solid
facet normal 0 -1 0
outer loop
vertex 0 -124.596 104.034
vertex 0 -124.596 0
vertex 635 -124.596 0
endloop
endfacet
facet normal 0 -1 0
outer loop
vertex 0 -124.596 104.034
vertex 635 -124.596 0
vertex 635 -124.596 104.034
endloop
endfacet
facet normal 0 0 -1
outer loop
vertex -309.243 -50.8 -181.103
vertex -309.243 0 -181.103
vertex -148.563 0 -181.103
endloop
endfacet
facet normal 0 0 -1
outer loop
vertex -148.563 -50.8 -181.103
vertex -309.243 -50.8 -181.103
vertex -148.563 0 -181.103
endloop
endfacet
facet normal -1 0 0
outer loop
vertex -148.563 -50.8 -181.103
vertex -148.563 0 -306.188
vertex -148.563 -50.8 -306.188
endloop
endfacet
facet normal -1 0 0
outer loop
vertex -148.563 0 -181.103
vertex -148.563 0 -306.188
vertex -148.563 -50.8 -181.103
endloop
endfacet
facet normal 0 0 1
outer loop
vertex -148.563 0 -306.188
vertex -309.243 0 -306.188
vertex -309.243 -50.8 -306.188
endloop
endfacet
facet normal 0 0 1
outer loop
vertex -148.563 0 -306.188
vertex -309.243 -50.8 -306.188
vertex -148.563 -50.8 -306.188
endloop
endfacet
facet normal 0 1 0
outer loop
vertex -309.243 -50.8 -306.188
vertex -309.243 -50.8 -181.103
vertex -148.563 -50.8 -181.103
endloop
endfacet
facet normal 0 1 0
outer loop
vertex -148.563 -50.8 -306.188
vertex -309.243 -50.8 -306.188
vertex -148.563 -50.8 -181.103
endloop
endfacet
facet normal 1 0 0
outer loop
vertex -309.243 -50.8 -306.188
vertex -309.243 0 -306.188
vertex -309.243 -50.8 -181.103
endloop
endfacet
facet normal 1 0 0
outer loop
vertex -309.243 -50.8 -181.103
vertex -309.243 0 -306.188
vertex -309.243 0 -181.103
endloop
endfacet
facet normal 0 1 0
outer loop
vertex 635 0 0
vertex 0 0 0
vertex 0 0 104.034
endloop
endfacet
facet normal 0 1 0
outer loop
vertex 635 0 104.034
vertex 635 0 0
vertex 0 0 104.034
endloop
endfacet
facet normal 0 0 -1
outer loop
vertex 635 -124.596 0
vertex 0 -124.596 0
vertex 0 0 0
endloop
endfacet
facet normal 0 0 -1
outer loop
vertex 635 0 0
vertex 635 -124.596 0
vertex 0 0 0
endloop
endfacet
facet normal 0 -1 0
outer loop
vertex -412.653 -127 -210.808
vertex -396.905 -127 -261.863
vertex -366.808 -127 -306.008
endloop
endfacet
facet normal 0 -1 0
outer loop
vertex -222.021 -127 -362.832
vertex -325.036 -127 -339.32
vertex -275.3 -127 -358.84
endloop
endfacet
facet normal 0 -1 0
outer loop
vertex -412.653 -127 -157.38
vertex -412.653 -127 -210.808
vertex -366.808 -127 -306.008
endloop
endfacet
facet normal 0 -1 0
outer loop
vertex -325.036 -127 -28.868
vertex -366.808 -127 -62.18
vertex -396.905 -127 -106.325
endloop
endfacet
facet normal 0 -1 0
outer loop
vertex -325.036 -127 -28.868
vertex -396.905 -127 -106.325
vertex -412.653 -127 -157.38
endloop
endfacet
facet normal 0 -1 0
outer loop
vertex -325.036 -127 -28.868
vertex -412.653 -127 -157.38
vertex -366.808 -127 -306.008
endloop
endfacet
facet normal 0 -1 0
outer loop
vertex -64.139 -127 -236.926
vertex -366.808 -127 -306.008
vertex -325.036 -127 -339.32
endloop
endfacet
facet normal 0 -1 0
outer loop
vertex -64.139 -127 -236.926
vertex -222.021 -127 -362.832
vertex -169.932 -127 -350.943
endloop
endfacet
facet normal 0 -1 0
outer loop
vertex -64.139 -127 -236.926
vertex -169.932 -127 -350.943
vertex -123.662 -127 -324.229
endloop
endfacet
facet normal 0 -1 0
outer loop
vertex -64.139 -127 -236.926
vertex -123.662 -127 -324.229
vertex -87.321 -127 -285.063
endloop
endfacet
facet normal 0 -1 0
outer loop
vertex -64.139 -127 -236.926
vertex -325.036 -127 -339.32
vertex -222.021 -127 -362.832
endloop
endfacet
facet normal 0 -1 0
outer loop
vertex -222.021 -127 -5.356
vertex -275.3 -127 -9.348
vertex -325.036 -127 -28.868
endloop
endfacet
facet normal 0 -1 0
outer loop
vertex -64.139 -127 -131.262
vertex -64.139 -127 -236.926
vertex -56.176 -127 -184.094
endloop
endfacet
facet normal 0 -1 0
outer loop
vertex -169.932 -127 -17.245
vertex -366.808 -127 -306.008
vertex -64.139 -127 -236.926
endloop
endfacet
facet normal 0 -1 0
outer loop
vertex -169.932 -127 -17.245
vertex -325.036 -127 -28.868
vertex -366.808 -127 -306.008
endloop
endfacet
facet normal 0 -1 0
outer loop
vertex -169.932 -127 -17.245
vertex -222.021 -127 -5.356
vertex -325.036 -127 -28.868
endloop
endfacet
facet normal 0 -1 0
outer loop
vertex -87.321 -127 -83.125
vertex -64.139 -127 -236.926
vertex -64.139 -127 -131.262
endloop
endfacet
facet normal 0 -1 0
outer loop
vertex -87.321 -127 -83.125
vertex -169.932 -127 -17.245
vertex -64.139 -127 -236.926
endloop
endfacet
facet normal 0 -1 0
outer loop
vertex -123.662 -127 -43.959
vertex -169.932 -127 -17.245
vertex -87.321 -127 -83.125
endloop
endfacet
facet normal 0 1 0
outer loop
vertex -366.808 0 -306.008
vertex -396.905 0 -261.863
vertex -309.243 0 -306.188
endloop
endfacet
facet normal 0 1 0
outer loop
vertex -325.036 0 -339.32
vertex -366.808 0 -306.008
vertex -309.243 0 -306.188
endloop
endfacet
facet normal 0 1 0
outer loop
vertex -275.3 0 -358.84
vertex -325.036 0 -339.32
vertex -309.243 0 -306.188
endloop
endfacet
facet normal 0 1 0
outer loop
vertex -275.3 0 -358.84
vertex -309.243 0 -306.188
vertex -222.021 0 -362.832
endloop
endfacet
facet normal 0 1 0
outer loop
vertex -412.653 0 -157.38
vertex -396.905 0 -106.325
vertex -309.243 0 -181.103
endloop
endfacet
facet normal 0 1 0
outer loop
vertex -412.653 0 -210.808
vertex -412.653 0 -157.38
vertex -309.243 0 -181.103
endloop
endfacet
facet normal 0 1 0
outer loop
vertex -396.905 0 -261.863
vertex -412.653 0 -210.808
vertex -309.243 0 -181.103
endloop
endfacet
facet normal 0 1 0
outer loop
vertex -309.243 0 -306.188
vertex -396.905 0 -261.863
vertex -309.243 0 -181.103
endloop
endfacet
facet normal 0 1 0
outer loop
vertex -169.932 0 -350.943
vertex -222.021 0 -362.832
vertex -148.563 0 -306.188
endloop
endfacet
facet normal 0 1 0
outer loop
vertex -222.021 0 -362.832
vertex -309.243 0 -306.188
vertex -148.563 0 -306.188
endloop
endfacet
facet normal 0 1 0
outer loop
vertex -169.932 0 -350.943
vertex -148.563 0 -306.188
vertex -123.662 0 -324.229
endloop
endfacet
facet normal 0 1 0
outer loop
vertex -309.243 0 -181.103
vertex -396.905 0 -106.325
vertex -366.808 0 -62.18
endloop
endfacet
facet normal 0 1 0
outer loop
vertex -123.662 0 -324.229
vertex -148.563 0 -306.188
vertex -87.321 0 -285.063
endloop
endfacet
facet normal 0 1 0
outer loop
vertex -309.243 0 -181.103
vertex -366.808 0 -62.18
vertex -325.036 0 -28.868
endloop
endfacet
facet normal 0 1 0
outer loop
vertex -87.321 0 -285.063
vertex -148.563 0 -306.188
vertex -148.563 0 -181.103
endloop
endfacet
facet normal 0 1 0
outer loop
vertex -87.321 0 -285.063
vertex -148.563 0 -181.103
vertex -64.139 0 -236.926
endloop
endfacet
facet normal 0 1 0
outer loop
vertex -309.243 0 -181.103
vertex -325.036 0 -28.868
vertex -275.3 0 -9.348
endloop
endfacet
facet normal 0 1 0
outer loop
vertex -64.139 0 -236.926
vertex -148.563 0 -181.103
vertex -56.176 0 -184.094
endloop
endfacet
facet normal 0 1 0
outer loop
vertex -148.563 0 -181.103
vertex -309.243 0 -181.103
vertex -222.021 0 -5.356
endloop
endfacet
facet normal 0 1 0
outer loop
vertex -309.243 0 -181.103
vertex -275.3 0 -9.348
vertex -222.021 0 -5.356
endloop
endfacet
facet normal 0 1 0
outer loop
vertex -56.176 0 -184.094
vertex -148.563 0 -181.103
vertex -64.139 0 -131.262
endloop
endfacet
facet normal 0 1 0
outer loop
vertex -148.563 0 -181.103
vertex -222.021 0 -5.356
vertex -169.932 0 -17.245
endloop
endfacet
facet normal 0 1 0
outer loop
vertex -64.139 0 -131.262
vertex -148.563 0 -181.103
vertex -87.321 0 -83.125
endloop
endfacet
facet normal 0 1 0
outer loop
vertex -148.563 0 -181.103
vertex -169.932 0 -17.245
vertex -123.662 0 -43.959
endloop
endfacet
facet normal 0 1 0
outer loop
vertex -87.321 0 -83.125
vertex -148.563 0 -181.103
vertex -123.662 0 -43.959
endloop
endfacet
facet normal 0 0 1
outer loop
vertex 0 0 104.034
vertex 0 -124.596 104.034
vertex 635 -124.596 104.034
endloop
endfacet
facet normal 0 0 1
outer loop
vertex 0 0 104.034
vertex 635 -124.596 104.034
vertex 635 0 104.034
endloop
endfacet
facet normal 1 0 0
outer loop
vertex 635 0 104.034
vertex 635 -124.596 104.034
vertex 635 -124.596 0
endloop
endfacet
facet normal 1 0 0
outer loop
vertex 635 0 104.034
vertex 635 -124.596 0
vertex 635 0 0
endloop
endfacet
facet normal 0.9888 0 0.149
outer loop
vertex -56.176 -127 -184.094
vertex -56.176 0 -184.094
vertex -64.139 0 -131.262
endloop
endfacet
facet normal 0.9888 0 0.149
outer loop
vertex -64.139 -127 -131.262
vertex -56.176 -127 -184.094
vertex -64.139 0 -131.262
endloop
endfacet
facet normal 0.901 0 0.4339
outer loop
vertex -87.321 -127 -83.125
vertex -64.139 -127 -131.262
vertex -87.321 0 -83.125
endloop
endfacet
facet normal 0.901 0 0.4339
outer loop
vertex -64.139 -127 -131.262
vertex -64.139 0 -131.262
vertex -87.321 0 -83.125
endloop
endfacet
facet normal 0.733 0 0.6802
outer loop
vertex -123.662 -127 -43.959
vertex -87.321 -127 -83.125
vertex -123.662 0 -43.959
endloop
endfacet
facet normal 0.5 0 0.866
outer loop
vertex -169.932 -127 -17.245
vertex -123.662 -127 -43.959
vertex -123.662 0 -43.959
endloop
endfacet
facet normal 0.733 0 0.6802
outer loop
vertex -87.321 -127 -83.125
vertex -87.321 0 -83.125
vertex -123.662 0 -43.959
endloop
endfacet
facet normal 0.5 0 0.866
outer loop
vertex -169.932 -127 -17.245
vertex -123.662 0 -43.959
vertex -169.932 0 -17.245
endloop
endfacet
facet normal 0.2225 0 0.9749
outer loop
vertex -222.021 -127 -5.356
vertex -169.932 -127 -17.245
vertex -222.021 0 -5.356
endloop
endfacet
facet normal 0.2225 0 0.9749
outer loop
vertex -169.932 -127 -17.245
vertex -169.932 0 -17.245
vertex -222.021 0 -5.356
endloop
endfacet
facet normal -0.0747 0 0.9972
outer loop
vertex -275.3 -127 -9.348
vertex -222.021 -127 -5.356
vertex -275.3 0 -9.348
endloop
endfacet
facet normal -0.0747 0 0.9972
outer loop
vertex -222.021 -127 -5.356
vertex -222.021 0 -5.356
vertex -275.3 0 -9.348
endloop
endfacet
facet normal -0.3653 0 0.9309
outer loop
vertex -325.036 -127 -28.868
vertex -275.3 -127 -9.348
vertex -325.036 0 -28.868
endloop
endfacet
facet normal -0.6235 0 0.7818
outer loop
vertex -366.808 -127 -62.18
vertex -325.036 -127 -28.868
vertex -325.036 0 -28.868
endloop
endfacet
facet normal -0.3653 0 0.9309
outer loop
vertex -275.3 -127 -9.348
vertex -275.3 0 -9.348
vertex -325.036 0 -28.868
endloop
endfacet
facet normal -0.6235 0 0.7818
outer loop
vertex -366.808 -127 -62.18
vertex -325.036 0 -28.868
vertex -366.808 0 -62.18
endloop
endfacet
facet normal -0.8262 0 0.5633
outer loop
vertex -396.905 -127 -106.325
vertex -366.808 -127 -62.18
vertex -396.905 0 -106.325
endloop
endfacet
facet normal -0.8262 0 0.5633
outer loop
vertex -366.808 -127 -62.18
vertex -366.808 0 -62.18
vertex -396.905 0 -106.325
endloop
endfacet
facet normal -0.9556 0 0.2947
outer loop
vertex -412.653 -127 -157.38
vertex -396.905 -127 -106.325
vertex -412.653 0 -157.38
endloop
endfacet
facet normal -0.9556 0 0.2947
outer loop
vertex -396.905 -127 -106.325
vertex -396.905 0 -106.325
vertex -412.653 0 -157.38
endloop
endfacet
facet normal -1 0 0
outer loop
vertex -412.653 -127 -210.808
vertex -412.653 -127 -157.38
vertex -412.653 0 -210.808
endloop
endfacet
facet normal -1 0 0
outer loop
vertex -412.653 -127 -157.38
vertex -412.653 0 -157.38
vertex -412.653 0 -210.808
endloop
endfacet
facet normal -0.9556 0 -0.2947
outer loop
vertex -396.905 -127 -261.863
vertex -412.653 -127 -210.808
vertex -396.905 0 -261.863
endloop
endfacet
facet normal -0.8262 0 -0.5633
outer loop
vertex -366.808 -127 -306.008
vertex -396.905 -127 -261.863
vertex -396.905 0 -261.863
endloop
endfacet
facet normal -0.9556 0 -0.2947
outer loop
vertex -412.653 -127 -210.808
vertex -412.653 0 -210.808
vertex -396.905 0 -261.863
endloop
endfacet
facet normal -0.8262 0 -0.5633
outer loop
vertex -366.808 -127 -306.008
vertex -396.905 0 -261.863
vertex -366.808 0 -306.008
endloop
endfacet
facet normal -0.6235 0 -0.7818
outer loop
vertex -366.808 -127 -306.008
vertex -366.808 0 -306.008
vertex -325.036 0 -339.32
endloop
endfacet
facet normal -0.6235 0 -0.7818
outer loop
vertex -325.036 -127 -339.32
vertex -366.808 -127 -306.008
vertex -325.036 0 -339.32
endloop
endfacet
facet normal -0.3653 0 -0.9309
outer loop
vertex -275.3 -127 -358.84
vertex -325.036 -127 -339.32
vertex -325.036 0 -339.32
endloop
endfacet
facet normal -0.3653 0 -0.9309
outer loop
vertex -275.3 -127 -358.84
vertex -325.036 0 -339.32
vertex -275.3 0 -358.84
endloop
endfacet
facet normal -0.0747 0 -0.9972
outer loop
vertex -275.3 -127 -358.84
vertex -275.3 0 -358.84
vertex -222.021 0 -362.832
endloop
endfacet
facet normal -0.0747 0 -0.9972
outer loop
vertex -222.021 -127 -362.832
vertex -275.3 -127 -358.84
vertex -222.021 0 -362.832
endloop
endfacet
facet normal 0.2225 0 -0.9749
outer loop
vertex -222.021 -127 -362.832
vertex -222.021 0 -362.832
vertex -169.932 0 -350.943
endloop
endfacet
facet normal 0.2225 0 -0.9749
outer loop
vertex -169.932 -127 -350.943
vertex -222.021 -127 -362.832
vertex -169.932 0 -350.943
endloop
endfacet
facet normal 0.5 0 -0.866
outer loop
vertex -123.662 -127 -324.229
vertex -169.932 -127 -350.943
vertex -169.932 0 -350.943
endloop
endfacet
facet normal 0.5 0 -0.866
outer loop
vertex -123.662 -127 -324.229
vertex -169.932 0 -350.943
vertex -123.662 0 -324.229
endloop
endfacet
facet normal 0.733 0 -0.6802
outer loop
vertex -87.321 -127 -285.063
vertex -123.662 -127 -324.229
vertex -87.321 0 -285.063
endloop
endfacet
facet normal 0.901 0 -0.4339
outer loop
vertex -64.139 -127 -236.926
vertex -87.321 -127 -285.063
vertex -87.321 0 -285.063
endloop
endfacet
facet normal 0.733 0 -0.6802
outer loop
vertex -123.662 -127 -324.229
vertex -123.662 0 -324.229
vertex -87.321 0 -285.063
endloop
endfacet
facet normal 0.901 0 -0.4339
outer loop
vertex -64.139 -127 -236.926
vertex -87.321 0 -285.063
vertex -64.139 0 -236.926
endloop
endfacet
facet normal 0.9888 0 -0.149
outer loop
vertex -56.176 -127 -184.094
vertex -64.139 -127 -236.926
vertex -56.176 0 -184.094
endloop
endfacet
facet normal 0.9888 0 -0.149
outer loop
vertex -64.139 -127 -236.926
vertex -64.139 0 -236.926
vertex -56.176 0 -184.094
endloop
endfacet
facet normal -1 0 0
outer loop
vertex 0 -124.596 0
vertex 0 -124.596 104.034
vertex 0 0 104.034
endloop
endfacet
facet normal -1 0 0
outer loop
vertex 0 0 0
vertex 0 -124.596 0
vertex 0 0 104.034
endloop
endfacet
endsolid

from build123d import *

# Parameters (mm, degrees)
F0_W     = 124.596402
F0_H     = 104.034252
F1_DEPTH = 635
F2_W     = 159.774974
F2_H     = 214.787192
F3_DEPTH = 25.4
F4_R     = 179.239616
F5_DEPTH = 127
F6_W     = 160.67934
F6_H     = 125.084535
F7_DEPTH = 50.8


with BuildPart() as f1:
    # F0 (on Right) → F1 (new body)
    with BuildSketch(Plane.YZ):
        with Locations((-62.298201, 52.017126)):
            Rectangle(F0_W, F0_H)
    extrude(amount=F1_DEPTH)

    # F2 (on Front) → F3 (cut)
    with BuildSketch(Plane.XZ):
        with Locations((-210.452251, 43.300625)):
            Rectangle(F2_W, F2_H)
    extrude(amount=F3_DEPTH, mode=Mode.SUBTRACT)


with BuildPart() as f5:
    # F4 (on Front) → F5 (new body)
    with BuildSketch(Plane.XZ):
        with Locations((-235.415787, -184.093982)):
            Circle(F4_R)
    extrude(amount=F5_DEPTH)

    # F6 (on Front) → F7 (cut)
    with BuildSketch(Plane.XZ):
        with Locations((-228.903055, -243.64566)):
            Rectangle(F6_W, F6_H)
    extrude(amount=F7_DEPTH, mode=Mode.SUBTRACT)


solid = Compound([f1.part, f5.part])
